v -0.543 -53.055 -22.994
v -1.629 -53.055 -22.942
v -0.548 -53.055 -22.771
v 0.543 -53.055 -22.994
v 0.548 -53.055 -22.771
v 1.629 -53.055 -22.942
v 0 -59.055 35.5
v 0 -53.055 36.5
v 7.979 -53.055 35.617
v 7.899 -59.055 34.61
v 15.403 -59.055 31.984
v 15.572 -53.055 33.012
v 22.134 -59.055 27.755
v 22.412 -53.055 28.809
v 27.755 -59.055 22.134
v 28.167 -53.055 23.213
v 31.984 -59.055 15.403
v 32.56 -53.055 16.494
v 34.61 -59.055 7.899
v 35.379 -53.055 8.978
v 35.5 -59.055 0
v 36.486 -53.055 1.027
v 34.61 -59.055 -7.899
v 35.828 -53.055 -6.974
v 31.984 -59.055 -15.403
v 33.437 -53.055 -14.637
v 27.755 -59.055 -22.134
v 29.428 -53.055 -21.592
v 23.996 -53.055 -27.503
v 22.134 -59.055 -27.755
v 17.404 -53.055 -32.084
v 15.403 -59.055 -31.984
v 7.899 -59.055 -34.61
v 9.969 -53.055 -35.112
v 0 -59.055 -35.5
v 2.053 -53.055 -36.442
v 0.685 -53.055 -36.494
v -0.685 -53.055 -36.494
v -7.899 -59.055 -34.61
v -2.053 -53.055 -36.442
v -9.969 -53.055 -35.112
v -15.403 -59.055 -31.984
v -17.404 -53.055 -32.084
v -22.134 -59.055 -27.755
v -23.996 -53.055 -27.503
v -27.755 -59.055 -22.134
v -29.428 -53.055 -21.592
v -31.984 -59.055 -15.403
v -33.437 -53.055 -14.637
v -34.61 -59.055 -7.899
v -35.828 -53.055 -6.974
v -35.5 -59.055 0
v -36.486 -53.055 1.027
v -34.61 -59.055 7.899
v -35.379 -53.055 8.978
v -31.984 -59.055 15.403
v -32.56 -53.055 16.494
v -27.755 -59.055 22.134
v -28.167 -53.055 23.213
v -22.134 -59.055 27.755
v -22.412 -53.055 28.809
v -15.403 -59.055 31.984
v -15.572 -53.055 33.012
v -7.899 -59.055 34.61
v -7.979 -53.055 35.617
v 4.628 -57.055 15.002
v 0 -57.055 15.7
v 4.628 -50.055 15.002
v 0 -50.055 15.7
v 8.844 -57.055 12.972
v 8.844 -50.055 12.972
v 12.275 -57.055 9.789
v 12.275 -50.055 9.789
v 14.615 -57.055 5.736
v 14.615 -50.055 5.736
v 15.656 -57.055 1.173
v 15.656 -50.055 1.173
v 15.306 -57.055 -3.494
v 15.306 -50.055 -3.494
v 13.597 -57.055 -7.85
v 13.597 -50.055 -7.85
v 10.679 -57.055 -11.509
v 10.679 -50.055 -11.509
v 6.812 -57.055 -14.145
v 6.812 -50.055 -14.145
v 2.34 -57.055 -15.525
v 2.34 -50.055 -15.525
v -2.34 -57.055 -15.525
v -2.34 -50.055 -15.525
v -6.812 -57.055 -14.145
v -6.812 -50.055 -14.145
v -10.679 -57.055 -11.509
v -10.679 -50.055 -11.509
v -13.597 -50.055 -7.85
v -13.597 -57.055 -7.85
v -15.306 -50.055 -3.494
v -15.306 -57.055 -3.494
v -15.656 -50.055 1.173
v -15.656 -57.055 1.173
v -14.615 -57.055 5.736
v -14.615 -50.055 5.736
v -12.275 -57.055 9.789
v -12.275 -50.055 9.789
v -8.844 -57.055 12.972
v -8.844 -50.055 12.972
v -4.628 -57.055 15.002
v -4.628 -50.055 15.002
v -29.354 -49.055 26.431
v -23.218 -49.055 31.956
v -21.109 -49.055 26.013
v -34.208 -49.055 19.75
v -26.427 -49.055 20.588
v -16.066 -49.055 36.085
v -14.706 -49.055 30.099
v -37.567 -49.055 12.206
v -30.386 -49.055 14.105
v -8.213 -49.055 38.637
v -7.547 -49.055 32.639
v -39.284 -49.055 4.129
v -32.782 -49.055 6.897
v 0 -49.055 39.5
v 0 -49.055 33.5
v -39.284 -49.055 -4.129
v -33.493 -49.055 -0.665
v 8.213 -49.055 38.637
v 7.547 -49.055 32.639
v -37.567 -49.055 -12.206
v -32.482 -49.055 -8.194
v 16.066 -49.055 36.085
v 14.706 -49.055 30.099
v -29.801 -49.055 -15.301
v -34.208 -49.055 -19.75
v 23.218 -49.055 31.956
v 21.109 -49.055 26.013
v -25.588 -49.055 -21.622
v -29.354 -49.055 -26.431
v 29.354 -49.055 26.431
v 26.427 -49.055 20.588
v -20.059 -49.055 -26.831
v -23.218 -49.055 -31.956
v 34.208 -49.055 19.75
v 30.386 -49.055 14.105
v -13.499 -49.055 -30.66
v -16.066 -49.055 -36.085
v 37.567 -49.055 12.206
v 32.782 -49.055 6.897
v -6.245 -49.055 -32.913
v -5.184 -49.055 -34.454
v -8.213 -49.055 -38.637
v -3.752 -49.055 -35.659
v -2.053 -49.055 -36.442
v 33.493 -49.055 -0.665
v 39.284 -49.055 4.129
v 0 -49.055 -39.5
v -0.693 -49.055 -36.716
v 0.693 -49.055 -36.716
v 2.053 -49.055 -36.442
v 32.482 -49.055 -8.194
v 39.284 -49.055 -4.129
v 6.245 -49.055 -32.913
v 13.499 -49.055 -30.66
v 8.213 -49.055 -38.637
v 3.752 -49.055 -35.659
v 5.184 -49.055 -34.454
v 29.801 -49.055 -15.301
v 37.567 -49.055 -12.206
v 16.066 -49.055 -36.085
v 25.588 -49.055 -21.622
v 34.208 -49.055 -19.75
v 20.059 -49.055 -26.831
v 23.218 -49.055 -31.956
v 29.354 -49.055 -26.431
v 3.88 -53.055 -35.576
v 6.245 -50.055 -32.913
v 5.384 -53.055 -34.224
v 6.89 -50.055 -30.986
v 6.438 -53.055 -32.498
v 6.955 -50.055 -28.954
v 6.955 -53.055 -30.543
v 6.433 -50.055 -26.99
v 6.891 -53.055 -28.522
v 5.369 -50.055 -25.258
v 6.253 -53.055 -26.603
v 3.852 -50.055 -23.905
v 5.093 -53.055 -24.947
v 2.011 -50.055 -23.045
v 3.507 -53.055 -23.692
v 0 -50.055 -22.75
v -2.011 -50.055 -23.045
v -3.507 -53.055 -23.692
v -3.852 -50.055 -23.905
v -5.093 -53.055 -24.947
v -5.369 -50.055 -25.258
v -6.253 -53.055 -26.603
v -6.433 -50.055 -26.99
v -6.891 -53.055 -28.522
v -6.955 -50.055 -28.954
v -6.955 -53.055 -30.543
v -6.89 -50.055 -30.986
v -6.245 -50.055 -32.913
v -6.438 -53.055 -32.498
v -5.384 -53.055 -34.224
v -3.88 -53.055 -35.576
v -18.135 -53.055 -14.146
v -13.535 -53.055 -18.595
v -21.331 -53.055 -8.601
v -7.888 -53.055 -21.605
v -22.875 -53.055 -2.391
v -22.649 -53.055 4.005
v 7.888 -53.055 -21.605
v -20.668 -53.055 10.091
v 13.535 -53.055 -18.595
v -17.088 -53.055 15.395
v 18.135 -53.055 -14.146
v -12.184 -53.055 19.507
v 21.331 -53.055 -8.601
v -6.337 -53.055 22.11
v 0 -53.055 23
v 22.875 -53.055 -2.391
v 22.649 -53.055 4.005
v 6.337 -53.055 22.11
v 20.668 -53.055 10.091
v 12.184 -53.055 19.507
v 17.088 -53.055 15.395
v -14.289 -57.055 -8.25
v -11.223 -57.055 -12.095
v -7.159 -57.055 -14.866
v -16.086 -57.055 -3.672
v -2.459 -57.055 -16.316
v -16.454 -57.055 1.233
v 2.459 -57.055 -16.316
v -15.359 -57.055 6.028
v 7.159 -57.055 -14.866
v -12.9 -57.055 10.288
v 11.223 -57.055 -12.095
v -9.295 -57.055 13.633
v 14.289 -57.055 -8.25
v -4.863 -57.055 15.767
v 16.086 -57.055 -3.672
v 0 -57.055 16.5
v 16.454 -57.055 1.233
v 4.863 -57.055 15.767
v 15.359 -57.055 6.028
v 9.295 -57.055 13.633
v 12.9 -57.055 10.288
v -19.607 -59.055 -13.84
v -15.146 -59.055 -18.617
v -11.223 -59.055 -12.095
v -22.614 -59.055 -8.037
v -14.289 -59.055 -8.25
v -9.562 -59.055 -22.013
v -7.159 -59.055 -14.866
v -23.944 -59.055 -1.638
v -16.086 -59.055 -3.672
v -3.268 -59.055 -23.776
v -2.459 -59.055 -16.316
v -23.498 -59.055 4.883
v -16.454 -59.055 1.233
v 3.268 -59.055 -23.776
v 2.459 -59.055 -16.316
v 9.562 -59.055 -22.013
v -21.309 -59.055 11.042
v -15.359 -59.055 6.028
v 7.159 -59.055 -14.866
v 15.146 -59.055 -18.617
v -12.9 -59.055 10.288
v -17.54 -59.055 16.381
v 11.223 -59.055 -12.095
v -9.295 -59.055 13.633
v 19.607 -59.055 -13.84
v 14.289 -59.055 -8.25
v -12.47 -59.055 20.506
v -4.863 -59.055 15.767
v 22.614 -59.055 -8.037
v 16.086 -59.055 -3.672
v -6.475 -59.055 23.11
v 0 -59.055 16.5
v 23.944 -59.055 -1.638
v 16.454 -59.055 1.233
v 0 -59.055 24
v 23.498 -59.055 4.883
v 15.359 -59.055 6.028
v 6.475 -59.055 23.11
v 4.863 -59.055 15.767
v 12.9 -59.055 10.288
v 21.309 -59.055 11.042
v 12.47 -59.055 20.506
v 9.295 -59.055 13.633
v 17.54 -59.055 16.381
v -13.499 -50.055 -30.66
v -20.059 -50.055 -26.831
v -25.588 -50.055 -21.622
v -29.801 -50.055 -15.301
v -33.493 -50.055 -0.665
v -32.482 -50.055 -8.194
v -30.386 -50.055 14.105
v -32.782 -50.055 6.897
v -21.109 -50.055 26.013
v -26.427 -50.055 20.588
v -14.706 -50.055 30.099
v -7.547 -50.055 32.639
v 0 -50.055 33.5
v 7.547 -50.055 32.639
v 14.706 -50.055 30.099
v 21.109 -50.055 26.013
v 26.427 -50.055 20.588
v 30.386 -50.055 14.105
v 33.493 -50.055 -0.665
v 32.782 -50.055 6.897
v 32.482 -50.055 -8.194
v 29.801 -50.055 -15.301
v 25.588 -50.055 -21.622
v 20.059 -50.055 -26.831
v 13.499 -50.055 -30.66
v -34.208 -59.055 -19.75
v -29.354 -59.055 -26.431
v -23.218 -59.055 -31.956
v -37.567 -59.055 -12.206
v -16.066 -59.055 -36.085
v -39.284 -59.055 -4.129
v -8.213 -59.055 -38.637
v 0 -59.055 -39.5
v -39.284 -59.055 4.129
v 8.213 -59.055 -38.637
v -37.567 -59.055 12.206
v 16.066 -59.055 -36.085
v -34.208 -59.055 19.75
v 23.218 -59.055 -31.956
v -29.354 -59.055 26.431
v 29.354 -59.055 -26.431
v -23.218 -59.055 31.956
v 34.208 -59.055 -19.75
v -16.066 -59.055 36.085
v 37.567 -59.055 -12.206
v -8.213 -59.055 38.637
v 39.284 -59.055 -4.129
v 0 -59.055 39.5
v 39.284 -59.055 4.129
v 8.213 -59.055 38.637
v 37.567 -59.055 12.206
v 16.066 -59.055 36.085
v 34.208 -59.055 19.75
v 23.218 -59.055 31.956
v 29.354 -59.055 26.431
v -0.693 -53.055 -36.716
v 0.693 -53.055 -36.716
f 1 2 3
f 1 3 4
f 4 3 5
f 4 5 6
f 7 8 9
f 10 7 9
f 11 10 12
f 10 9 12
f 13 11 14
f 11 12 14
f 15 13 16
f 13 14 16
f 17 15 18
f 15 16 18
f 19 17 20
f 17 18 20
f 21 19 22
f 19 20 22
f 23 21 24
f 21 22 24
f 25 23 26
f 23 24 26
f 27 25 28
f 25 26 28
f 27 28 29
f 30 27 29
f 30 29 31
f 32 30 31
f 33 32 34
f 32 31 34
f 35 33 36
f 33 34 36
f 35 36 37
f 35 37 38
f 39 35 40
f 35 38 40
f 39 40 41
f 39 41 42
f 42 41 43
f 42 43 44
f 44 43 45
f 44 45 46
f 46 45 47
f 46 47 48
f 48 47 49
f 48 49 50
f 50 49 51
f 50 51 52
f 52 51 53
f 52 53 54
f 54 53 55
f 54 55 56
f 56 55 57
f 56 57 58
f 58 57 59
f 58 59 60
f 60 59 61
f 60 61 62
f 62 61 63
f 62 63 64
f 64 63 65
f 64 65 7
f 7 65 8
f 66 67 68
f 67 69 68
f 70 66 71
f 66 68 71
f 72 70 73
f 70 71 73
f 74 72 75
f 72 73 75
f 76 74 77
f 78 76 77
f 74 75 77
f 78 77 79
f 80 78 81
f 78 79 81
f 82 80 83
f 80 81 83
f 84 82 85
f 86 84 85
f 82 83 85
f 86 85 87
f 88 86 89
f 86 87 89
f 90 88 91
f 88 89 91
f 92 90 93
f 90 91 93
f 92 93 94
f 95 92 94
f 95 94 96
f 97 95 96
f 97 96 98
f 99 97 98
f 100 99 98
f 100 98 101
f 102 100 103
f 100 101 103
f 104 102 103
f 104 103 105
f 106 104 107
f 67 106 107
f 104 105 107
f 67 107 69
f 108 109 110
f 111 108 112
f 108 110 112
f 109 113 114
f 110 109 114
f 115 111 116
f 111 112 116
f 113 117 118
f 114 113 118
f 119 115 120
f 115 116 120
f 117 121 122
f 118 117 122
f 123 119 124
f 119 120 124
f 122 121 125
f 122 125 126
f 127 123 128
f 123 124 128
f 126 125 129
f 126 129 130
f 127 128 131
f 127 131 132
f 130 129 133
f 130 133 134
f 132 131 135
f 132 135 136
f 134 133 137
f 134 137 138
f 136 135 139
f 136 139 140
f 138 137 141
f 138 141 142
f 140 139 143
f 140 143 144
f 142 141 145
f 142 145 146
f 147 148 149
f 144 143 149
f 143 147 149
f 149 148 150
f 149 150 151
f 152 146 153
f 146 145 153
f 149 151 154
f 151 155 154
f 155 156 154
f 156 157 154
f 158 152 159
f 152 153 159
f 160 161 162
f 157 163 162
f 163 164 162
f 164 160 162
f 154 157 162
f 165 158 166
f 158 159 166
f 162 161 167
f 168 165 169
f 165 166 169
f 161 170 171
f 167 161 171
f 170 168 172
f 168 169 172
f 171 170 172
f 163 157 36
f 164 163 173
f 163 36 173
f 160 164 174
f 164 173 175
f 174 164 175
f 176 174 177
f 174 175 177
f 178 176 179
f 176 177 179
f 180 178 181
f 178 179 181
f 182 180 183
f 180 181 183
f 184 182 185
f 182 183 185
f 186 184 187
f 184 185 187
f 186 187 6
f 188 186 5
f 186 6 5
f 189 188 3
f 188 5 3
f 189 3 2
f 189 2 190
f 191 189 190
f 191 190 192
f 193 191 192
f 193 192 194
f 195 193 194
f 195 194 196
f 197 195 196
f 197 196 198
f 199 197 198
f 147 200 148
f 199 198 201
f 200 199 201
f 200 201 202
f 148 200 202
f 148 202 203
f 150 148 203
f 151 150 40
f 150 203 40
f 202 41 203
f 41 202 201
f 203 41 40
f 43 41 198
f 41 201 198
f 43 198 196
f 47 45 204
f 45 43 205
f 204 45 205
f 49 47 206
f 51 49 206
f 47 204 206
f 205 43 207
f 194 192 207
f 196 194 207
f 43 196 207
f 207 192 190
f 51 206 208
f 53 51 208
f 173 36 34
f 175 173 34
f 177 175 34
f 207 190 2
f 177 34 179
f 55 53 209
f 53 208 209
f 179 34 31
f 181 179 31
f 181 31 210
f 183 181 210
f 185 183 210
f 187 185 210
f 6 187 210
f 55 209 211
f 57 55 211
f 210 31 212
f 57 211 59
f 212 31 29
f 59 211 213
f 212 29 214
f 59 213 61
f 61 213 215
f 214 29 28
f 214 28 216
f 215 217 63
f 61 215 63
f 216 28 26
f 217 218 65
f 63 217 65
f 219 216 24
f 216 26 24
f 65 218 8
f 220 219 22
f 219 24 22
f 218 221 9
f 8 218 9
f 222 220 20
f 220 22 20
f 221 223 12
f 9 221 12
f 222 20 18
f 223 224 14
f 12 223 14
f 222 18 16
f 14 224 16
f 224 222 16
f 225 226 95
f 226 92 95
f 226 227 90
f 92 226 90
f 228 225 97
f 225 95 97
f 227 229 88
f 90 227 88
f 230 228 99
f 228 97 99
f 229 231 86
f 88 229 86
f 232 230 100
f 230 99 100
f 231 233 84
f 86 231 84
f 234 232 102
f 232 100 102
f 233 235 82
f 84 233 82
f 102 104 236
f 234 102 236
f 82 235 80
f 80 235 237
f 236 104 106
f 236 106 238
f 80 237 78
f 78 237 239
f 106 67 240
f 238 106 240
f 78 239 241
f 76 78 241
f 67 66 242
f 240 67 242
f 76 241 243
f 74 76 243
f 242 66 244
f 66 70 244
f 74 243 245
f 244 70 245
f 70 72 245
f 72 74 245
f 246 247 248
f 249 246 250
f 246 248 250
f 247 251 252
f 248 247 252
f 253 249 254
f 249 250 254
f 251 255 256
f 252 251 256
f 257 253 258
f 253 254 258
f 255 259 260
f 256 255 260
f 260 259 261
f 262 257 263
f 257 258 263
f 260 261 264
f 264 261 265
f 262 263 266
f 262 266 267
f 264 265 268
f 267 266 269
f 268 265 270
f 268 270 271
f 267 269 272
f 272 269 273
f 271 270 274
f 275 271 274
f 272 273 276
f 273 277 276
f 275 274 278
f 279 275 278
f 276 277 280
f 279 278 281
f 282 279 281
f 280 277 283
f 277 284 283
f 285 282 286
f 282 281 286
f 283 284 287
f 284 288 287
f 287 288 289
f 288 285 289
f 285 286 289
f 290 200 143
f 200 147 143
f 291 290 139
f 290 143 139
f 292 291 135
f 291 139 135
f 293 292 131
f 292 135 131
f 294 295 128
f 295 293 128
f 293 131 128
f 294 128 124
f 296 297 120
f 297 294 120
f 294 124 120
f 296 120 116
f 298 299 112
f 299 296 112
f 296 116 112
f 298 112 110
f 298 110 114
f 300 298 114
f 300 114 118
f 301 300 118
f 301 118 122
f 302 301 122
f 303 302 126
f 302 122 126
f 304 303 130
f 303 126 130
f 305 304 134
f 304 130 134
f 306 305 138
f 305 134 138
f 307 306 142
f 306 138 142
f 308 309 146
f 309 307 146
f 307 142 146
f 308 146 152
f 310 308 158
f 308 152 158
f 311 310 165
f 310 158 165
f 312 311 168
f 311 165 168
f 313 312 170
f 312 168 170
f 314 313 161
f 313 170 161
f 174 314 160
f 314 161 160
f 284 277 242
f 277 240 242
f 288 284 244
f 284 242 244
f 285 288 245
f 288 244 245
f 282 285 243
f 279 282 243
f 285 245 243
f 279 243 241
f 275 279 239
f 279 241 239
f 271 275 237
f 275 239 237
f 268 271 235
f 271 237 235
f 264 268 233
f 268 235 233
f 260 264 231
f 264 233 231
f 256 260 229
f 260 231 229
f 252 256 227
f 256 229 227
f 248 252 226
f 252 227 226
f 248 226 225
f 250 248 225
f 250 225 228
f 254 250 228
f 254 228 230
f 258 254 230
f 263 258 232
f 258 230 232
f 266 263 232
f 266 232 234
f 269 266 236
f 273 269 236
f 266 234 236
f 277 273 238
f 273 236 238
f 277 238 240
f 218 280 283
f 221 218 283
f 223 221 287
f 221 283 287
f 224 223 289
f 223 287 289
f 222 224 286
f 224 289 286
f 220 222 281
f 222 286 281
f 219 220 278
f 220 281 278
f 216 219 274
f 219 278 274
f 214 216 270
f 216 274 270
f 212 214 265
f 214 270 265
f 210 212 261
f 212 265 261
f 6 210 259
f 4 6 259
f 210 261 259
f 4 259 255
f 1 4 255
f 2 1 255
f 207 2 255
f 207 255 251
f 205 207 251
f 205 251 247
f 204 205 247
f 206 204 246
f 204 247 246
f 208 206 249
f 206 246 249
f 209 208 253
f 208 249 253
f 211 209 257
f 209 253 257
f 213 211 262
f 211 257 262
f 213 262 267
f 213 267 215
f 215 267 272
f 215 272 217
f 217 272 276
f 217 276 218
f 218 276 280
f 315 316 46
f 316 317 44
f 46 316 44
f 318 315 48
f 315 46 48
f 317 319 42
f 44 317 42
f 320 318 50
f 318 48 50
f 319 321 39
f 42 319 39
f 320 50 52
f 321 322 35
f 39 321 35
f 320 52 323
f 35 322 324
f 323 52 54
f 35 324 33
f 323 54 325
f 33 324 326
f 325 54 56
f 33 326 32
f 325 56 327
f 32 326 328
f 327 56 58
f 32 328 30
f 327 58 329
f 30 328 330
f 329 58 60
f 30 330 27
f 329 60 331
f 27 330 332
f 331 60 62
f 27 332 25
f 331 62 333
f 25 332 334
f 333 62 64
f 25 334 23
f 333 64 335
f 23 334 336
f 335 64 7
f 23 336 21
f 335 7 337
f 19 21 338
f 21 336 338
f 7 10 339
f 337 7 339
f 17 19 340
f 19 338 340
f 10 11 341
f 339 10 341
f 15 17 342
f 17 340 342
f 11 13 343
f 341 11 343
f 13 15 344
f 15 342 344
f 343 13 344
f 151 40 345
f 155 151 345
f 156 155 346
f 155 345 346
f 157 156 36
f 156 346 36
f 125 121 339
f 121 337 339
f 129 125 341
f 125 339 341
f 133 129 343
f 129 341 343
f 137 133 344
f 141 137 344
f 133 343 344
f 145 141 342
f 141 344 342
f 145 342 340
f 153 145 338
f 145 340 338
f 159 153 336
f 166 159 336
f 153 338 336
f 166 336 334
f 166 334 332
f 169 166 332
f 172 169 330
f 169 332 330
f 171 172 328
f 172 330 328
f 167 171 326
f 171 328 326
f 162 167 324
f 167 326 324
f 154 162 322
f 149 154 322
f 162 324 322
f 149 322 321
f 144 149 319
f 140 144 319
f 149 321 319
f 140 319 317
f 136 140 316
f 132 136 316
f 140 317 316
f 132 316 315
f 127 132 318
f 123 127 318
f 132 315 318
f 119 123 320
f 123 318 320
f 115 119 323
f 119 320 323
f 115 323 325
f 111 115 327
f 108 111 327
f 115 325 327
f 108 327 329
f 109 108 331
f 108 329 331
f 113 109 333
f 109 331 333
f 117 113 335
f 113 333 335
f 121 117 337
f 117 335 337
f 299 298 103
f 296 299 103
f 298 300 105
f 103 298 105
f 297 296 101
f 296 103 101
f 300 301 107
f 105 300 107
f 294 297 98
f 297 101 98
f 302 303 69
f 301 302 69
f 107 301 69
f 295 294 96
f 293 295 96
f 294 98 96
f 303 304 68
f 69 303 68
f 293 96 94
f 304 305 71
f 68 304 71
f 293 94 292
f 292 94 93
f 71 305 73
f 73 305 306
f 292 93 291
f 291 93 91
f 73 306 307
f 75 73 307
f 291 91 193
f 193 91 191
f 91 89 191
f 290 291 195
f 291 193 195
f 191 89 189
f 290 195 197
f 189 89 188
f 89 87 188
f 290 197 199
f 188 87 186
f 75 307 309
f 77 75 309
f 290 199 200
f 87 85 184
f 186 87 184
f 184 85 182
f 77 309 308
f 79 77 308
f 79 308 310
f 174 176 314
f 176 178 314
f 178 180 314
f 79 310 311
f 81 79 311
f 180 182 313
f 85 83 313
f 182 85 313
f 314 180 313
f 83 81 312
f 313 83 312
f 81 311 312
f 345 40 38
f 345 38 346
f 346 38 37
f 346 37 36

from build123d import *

# Parameters (mm, degrees)
F2_R     = 7
F3_DEPTH = 4.001


# Not quite as in the source:
# - a feature names something its author has since deleted; it is built from what else it names


with BuildPart() as f1:
    # F0 (on Right) → F1 (revolve)
    with BuildSketch(Plane.YZ):
        Polygon((-59.0552871114, 24), (-59.0552871114, 16.5), (-57.0552871114, 16.5), (-57.0552871114, 15.7), (-50.0552871114, 15.7), (-50.0552871114, 33.5), (-49.0552871114, 33.5), (-49.0552871114, 39.5), (-59.0552871114, 39.5), (-59.0552871114, 35.5), (-53.0552871114, 36.5), (-53.0552871114, 23), align=None)
    revolve(axis=Axis((0, -43.8180491328, 0), (0, 1, 0)))

    # F2 (on face) → F3 (cut, through all)
    with BuildSketch(Plane.XZ.offset(53.0552871114)):
        with Locations((0, -29.75)):
            Circle(F2_R)
        with BuildLine():
            ThreePointArc((-2.0528271341, -36.4422268908), (0, -36.75), (2.0528271341, -36.4422268908))
            ThreePointArc((2.0528271341, -36.4422268908), (0, -36.5), (-2.0528271341, -36.4422268908))
        make_face()
    extrude(amount=-F3_DEPTH, mode=Mode.SUBTRACT)


solid = f1.part
